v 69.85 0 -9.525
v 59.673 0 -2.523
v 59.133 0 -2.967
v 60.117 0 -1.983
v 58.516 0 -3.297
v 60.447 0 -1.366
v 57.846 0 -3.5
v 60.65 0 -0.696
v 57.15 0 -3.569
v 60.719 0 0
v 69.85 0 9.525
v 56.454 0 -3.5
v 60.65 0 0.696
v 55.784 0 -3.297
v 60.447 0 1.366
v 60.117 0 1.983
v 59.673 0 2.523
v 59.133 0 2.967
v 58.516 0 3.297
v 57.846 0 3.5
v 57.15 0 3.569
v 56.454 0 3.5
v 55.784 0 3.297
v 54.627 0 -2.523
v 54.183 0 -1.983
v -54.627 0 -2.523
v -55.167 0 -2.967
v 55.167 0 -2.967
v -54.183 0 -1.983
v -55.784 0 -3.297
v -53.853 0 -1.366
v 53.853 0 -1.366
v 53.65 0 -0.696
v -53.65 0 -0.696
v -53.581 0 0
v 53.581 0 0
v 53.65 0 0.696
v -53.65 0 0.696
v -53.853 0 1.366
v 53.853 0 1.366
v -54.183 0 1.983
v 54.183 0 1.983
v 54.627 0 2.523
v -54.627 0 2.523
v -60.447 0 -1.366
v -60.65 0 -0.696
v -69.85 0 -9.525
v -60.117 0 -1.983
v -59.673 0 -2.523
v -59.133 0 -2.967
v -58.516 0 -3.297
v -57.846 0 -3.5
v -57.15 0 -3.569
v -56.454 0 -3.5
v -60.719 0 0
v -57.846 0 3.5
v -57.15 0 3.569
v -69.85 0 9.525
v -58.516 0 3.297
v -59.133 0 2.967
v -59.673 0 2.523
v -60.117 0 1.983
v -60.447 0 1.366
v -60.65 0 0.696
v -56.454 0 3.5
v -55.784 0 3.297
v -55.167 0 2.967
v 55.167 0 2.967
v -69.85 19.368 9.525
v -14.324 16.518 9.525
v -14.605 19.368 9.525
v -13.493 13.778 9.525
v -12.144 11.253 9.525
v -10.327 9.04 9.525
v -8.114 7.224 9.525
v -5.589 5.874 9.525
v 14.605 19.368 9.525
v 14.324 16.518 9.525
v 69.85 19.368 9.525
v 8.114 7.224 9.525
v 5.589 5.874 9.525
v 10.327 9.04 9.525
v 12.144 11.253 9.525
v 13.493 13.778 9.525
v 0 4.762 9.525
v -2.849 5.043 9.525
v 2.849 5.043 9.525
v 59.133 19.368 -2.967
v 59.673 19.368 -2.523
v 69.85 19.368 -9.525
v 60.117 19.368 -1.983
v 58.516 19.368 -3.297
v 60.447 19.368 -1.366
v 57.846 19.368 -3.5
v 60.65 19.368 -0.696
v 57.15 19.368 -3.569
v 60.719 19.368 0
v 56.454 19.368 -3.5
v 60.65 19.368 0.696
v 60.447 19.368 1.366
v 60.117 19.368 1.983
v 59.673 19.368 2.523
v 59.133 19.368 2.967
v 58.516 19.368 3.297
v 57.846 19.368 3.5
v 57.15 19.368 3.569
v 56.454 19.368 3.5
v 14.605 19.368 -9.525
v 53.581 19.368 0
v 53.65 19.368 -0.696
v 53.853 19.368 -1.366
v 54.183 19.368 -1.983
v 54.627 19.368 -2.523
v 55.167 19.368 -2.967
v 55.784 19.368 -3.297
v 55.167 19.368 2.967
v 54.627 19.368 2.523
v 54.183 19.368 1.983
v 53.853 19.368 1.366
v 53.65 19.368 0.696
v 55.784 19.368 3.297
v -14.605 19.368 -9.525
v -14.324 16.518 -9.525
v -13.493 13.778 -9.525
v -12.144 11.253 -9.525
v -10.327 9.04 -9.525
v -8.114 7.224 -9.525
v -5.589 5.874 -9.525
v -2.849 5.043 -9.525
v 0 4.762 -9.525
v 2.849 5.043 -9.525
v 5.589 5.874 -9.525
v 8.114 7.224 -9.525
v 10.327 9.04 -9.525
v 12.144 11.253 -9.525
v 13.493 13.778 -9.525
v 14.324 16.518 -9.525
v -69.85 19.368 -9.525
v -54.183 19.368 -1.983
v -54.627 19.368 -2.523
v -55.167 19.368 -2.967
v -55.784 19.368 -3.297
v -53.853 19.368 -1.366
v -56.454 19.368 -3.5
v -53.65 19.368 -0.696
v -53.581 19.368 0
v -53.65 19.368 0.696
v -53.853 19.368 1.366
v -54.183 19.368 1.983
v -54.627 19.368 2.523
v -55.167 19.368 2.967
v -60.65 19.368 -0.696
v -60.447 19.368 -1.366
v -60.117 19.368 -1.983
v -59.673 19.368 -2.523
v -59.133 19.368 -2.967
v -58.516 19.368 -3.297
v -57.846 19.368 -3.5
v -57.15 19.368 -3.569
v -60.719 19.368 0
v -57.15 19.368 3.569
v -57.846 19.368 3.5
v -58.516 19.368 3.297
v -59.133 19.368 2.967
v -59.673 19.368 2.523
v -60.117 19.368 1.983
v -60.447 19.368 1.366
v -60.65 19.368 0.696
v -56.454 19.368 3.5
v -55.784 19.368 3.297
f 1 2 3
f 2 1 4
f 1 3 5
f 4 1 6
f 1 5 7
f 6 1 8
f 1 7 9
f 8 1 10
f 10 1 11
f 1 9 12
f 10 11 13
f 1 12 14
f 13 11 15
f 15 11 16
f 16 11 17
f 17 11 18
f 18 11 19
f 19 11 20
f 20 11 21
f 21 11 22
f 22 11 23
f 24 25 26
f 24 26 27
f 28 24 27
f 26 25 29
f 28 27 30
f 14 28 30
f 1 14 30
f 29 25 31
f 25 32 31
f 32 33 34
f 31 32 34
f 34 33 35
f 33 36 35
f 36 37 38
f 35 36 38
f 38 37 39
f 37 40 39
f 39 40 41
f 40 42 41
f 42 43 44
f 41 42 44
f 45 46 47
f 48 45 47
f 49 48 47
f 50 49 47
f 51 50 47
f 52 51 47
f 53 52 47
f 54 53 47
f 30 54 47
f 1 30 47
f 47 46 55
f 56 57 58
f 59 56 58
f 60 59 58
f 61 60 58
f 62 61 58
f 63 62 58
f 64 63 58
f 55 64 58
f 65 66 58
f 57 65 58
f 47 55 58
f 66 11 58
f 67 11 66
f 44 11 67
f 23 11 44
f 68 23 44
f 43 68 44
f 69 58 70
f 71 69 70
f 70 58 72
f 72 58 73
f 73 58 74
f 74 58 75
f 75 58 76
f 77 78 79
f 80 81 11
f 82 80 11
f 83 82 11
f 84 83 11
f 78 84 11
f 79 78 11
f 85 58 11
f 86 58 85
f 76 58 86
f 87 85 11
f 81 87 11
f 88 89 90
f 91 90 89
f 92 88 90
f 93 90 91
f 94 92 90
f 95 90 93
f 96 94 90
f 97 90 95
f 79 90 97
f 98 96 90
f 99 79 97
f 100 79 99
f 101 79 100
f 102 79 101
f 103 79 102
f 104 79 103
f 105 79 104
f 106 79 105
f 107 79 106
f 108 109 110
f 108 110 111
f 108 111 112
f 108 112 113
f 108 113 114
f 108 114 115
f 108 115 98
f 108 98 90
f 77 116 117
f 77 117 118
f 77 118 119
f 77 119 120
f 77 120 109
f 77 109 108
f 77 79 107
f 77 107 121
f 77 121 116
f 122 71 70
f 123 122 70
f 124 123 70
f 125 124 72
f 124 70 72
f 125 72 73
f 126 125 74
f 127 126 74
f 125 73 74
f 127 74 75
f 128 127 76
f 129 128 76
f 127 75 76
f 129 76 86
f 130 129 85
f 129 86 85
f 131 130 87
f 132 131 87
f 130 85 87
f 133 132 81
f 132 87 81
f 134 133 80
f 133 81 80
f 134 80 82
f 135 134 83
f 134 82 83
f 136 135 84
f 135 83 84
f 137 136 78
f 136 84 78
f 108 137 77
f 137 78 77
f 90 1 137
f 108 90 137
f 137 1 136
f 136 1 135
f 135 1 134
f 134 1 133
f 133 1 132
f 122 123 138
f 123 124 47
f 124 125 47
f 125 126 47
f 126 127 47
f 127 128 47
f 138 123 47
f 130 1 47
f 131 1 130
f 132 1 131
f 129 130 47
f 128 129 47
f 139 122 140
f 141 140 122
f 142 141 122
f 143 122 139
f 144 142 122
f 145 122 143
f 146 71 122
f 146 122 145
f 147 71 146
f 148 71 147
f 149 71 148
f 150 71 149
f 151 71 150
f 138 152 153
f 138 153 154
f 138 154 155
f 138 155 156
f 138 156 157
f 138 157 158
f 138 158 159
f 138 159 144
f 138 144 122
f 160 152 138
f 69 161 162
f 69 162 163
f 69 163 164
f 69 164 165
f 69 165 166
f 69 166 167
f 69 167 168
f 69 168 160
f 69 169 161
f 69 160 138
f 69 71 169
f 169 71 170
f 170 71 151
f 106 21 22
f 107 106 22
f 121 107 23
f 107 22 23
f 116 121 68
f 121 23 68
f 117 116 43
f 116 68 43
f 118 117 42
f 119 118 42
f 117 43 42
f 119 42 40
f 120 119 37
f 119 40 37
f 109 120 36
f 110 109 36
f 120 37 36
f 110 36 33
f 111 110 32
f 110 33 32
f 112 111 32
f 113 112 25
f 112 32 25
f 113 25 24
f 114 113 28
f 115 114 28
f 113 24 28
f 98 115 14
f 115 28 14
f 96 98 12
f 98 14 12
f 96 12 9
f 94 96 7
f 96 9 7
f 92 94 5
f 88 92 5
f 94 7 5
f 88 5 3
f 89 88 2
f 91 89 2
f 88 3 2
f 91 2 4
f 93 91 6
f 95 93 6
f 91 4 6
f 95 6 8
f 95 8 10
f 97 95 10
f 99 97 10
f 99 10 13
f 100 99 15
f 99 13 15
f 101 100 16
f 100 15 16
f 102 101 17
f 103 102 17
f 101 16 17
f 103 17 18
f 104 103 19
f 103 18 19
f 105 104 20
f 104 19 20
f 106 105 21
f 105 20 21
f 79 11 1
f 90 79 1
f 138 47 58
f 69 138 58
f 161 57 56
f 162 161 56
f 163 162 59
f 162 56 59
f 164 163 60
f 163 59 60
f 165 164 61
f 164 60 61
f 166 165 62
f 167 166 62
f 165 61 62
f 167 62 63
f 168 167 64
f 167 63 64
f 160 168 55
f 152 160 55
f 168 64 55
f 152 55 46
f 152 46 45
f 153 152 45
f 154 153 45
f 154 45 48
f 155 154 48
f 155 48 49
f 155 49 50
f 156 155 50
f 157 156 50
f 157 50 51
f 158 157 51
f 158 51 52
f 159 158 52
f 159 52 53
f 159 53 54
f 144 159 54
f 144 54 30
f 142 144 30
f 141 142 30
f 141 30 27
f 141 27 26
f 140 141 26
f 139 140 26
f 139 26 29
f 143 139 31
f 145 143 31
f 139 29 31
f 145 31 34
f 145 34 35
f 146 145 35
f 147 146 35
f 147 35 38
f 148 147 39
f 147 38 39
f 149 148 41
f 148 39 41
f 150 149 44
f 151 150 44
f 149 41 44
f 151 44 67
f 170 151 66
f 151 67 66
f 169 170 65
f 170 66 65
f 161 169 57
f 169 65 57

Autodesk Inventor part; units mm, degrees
ref_plane "YZ Plane" through (0, 0, 0) normal (1, 0, 0) x (0, 1, 0)
ref_plane "XZ Plane" through (0, 0, 0) normal (0, 1, 0) x (-1, 0, 0)
ref_plane "XY Plane" through (0, 0, 0) normal (0, 0, 1) x (1, 0, 0)
sketch "Sketch1" plane through (0, 0, 0) normal (0, 1, 0) x (-1, 0, 0)
  line L0 (69.85, 9.525) -> (-69.85, 9.525)
  line L1 (-69.85, 9.525) -> (-69.85, -9.525)
  line L2 (-69.85, -9.525) -> (69.85, -9.525)
  line L3 (69.85, -9.525) -> (69.85, 9.525)
  line L4 (69.85, 9.525) -> (-69.85, -9.525) construction
  line L5 (-69.85, 9.525) -> (69.85, -9.525) construction
  point P0 (0, 0)
  dimension "d0" = 139.7
  dimension "d1" = 19.05
extrude "Extrusion1" add sketch "Sketch1" along normal blind 19.3675
sketch "Sketch2" plane through (-69.85, 0, 9.525) normal (0, 0, 1) x (1, 0, 0)
  line L0 (0, 19.3675) -> (139.7, 19.3675) projected
  arc A0 (55.245, 19.3675) -> (84.455, 19.3675) centre (69.85, 19.3675) ccw
  point P0 (69.85, 0)
  dimension "d4" = 29.21
extrude "Extrusion2" cut sketch "Sketch2" against normal through all
sketch "Sketch3" plane through (0, 19.3675, 0) normal (0, 1, 0) x (1, 0, 0)
  line L0 (-69.85, -9.525) -> (-14.605, -9.525) projected
  line L1 (-69.85, 9.525) -> (-69.85, -9.525) projected
  line L2 (-14.605, 9.525) -> (-69.85, 9.525) projected
  line L3 (69.85, -9.525) -> (69.85, 9.525) projected
  line L4 (69.85, 9.525) -> (14.605, 9.525) projected
  line L5 (14.605, -9.525) -> (69.85, -9.525) projected
  point P0 (0, 0)
  point P1 (-57.15, 0)
  point P2 (57.15, 0)
  dimension "d7" = 9.525
  dimension "d8" = 12.7
  dimension "d13" = 9.525
  dimension "d14" = 12.7
hole "Hole1" at (-57.15, 19.3675, 0) at (57.15, 19.3675, 0) direction (0, -1, 0) diameter 7.1374 end through all clearance for "Hex Head Bolt" size "1/4" standard "Ansi Unified Screw Threads"
properties part number "BaseOfSwallowWatererV01"
